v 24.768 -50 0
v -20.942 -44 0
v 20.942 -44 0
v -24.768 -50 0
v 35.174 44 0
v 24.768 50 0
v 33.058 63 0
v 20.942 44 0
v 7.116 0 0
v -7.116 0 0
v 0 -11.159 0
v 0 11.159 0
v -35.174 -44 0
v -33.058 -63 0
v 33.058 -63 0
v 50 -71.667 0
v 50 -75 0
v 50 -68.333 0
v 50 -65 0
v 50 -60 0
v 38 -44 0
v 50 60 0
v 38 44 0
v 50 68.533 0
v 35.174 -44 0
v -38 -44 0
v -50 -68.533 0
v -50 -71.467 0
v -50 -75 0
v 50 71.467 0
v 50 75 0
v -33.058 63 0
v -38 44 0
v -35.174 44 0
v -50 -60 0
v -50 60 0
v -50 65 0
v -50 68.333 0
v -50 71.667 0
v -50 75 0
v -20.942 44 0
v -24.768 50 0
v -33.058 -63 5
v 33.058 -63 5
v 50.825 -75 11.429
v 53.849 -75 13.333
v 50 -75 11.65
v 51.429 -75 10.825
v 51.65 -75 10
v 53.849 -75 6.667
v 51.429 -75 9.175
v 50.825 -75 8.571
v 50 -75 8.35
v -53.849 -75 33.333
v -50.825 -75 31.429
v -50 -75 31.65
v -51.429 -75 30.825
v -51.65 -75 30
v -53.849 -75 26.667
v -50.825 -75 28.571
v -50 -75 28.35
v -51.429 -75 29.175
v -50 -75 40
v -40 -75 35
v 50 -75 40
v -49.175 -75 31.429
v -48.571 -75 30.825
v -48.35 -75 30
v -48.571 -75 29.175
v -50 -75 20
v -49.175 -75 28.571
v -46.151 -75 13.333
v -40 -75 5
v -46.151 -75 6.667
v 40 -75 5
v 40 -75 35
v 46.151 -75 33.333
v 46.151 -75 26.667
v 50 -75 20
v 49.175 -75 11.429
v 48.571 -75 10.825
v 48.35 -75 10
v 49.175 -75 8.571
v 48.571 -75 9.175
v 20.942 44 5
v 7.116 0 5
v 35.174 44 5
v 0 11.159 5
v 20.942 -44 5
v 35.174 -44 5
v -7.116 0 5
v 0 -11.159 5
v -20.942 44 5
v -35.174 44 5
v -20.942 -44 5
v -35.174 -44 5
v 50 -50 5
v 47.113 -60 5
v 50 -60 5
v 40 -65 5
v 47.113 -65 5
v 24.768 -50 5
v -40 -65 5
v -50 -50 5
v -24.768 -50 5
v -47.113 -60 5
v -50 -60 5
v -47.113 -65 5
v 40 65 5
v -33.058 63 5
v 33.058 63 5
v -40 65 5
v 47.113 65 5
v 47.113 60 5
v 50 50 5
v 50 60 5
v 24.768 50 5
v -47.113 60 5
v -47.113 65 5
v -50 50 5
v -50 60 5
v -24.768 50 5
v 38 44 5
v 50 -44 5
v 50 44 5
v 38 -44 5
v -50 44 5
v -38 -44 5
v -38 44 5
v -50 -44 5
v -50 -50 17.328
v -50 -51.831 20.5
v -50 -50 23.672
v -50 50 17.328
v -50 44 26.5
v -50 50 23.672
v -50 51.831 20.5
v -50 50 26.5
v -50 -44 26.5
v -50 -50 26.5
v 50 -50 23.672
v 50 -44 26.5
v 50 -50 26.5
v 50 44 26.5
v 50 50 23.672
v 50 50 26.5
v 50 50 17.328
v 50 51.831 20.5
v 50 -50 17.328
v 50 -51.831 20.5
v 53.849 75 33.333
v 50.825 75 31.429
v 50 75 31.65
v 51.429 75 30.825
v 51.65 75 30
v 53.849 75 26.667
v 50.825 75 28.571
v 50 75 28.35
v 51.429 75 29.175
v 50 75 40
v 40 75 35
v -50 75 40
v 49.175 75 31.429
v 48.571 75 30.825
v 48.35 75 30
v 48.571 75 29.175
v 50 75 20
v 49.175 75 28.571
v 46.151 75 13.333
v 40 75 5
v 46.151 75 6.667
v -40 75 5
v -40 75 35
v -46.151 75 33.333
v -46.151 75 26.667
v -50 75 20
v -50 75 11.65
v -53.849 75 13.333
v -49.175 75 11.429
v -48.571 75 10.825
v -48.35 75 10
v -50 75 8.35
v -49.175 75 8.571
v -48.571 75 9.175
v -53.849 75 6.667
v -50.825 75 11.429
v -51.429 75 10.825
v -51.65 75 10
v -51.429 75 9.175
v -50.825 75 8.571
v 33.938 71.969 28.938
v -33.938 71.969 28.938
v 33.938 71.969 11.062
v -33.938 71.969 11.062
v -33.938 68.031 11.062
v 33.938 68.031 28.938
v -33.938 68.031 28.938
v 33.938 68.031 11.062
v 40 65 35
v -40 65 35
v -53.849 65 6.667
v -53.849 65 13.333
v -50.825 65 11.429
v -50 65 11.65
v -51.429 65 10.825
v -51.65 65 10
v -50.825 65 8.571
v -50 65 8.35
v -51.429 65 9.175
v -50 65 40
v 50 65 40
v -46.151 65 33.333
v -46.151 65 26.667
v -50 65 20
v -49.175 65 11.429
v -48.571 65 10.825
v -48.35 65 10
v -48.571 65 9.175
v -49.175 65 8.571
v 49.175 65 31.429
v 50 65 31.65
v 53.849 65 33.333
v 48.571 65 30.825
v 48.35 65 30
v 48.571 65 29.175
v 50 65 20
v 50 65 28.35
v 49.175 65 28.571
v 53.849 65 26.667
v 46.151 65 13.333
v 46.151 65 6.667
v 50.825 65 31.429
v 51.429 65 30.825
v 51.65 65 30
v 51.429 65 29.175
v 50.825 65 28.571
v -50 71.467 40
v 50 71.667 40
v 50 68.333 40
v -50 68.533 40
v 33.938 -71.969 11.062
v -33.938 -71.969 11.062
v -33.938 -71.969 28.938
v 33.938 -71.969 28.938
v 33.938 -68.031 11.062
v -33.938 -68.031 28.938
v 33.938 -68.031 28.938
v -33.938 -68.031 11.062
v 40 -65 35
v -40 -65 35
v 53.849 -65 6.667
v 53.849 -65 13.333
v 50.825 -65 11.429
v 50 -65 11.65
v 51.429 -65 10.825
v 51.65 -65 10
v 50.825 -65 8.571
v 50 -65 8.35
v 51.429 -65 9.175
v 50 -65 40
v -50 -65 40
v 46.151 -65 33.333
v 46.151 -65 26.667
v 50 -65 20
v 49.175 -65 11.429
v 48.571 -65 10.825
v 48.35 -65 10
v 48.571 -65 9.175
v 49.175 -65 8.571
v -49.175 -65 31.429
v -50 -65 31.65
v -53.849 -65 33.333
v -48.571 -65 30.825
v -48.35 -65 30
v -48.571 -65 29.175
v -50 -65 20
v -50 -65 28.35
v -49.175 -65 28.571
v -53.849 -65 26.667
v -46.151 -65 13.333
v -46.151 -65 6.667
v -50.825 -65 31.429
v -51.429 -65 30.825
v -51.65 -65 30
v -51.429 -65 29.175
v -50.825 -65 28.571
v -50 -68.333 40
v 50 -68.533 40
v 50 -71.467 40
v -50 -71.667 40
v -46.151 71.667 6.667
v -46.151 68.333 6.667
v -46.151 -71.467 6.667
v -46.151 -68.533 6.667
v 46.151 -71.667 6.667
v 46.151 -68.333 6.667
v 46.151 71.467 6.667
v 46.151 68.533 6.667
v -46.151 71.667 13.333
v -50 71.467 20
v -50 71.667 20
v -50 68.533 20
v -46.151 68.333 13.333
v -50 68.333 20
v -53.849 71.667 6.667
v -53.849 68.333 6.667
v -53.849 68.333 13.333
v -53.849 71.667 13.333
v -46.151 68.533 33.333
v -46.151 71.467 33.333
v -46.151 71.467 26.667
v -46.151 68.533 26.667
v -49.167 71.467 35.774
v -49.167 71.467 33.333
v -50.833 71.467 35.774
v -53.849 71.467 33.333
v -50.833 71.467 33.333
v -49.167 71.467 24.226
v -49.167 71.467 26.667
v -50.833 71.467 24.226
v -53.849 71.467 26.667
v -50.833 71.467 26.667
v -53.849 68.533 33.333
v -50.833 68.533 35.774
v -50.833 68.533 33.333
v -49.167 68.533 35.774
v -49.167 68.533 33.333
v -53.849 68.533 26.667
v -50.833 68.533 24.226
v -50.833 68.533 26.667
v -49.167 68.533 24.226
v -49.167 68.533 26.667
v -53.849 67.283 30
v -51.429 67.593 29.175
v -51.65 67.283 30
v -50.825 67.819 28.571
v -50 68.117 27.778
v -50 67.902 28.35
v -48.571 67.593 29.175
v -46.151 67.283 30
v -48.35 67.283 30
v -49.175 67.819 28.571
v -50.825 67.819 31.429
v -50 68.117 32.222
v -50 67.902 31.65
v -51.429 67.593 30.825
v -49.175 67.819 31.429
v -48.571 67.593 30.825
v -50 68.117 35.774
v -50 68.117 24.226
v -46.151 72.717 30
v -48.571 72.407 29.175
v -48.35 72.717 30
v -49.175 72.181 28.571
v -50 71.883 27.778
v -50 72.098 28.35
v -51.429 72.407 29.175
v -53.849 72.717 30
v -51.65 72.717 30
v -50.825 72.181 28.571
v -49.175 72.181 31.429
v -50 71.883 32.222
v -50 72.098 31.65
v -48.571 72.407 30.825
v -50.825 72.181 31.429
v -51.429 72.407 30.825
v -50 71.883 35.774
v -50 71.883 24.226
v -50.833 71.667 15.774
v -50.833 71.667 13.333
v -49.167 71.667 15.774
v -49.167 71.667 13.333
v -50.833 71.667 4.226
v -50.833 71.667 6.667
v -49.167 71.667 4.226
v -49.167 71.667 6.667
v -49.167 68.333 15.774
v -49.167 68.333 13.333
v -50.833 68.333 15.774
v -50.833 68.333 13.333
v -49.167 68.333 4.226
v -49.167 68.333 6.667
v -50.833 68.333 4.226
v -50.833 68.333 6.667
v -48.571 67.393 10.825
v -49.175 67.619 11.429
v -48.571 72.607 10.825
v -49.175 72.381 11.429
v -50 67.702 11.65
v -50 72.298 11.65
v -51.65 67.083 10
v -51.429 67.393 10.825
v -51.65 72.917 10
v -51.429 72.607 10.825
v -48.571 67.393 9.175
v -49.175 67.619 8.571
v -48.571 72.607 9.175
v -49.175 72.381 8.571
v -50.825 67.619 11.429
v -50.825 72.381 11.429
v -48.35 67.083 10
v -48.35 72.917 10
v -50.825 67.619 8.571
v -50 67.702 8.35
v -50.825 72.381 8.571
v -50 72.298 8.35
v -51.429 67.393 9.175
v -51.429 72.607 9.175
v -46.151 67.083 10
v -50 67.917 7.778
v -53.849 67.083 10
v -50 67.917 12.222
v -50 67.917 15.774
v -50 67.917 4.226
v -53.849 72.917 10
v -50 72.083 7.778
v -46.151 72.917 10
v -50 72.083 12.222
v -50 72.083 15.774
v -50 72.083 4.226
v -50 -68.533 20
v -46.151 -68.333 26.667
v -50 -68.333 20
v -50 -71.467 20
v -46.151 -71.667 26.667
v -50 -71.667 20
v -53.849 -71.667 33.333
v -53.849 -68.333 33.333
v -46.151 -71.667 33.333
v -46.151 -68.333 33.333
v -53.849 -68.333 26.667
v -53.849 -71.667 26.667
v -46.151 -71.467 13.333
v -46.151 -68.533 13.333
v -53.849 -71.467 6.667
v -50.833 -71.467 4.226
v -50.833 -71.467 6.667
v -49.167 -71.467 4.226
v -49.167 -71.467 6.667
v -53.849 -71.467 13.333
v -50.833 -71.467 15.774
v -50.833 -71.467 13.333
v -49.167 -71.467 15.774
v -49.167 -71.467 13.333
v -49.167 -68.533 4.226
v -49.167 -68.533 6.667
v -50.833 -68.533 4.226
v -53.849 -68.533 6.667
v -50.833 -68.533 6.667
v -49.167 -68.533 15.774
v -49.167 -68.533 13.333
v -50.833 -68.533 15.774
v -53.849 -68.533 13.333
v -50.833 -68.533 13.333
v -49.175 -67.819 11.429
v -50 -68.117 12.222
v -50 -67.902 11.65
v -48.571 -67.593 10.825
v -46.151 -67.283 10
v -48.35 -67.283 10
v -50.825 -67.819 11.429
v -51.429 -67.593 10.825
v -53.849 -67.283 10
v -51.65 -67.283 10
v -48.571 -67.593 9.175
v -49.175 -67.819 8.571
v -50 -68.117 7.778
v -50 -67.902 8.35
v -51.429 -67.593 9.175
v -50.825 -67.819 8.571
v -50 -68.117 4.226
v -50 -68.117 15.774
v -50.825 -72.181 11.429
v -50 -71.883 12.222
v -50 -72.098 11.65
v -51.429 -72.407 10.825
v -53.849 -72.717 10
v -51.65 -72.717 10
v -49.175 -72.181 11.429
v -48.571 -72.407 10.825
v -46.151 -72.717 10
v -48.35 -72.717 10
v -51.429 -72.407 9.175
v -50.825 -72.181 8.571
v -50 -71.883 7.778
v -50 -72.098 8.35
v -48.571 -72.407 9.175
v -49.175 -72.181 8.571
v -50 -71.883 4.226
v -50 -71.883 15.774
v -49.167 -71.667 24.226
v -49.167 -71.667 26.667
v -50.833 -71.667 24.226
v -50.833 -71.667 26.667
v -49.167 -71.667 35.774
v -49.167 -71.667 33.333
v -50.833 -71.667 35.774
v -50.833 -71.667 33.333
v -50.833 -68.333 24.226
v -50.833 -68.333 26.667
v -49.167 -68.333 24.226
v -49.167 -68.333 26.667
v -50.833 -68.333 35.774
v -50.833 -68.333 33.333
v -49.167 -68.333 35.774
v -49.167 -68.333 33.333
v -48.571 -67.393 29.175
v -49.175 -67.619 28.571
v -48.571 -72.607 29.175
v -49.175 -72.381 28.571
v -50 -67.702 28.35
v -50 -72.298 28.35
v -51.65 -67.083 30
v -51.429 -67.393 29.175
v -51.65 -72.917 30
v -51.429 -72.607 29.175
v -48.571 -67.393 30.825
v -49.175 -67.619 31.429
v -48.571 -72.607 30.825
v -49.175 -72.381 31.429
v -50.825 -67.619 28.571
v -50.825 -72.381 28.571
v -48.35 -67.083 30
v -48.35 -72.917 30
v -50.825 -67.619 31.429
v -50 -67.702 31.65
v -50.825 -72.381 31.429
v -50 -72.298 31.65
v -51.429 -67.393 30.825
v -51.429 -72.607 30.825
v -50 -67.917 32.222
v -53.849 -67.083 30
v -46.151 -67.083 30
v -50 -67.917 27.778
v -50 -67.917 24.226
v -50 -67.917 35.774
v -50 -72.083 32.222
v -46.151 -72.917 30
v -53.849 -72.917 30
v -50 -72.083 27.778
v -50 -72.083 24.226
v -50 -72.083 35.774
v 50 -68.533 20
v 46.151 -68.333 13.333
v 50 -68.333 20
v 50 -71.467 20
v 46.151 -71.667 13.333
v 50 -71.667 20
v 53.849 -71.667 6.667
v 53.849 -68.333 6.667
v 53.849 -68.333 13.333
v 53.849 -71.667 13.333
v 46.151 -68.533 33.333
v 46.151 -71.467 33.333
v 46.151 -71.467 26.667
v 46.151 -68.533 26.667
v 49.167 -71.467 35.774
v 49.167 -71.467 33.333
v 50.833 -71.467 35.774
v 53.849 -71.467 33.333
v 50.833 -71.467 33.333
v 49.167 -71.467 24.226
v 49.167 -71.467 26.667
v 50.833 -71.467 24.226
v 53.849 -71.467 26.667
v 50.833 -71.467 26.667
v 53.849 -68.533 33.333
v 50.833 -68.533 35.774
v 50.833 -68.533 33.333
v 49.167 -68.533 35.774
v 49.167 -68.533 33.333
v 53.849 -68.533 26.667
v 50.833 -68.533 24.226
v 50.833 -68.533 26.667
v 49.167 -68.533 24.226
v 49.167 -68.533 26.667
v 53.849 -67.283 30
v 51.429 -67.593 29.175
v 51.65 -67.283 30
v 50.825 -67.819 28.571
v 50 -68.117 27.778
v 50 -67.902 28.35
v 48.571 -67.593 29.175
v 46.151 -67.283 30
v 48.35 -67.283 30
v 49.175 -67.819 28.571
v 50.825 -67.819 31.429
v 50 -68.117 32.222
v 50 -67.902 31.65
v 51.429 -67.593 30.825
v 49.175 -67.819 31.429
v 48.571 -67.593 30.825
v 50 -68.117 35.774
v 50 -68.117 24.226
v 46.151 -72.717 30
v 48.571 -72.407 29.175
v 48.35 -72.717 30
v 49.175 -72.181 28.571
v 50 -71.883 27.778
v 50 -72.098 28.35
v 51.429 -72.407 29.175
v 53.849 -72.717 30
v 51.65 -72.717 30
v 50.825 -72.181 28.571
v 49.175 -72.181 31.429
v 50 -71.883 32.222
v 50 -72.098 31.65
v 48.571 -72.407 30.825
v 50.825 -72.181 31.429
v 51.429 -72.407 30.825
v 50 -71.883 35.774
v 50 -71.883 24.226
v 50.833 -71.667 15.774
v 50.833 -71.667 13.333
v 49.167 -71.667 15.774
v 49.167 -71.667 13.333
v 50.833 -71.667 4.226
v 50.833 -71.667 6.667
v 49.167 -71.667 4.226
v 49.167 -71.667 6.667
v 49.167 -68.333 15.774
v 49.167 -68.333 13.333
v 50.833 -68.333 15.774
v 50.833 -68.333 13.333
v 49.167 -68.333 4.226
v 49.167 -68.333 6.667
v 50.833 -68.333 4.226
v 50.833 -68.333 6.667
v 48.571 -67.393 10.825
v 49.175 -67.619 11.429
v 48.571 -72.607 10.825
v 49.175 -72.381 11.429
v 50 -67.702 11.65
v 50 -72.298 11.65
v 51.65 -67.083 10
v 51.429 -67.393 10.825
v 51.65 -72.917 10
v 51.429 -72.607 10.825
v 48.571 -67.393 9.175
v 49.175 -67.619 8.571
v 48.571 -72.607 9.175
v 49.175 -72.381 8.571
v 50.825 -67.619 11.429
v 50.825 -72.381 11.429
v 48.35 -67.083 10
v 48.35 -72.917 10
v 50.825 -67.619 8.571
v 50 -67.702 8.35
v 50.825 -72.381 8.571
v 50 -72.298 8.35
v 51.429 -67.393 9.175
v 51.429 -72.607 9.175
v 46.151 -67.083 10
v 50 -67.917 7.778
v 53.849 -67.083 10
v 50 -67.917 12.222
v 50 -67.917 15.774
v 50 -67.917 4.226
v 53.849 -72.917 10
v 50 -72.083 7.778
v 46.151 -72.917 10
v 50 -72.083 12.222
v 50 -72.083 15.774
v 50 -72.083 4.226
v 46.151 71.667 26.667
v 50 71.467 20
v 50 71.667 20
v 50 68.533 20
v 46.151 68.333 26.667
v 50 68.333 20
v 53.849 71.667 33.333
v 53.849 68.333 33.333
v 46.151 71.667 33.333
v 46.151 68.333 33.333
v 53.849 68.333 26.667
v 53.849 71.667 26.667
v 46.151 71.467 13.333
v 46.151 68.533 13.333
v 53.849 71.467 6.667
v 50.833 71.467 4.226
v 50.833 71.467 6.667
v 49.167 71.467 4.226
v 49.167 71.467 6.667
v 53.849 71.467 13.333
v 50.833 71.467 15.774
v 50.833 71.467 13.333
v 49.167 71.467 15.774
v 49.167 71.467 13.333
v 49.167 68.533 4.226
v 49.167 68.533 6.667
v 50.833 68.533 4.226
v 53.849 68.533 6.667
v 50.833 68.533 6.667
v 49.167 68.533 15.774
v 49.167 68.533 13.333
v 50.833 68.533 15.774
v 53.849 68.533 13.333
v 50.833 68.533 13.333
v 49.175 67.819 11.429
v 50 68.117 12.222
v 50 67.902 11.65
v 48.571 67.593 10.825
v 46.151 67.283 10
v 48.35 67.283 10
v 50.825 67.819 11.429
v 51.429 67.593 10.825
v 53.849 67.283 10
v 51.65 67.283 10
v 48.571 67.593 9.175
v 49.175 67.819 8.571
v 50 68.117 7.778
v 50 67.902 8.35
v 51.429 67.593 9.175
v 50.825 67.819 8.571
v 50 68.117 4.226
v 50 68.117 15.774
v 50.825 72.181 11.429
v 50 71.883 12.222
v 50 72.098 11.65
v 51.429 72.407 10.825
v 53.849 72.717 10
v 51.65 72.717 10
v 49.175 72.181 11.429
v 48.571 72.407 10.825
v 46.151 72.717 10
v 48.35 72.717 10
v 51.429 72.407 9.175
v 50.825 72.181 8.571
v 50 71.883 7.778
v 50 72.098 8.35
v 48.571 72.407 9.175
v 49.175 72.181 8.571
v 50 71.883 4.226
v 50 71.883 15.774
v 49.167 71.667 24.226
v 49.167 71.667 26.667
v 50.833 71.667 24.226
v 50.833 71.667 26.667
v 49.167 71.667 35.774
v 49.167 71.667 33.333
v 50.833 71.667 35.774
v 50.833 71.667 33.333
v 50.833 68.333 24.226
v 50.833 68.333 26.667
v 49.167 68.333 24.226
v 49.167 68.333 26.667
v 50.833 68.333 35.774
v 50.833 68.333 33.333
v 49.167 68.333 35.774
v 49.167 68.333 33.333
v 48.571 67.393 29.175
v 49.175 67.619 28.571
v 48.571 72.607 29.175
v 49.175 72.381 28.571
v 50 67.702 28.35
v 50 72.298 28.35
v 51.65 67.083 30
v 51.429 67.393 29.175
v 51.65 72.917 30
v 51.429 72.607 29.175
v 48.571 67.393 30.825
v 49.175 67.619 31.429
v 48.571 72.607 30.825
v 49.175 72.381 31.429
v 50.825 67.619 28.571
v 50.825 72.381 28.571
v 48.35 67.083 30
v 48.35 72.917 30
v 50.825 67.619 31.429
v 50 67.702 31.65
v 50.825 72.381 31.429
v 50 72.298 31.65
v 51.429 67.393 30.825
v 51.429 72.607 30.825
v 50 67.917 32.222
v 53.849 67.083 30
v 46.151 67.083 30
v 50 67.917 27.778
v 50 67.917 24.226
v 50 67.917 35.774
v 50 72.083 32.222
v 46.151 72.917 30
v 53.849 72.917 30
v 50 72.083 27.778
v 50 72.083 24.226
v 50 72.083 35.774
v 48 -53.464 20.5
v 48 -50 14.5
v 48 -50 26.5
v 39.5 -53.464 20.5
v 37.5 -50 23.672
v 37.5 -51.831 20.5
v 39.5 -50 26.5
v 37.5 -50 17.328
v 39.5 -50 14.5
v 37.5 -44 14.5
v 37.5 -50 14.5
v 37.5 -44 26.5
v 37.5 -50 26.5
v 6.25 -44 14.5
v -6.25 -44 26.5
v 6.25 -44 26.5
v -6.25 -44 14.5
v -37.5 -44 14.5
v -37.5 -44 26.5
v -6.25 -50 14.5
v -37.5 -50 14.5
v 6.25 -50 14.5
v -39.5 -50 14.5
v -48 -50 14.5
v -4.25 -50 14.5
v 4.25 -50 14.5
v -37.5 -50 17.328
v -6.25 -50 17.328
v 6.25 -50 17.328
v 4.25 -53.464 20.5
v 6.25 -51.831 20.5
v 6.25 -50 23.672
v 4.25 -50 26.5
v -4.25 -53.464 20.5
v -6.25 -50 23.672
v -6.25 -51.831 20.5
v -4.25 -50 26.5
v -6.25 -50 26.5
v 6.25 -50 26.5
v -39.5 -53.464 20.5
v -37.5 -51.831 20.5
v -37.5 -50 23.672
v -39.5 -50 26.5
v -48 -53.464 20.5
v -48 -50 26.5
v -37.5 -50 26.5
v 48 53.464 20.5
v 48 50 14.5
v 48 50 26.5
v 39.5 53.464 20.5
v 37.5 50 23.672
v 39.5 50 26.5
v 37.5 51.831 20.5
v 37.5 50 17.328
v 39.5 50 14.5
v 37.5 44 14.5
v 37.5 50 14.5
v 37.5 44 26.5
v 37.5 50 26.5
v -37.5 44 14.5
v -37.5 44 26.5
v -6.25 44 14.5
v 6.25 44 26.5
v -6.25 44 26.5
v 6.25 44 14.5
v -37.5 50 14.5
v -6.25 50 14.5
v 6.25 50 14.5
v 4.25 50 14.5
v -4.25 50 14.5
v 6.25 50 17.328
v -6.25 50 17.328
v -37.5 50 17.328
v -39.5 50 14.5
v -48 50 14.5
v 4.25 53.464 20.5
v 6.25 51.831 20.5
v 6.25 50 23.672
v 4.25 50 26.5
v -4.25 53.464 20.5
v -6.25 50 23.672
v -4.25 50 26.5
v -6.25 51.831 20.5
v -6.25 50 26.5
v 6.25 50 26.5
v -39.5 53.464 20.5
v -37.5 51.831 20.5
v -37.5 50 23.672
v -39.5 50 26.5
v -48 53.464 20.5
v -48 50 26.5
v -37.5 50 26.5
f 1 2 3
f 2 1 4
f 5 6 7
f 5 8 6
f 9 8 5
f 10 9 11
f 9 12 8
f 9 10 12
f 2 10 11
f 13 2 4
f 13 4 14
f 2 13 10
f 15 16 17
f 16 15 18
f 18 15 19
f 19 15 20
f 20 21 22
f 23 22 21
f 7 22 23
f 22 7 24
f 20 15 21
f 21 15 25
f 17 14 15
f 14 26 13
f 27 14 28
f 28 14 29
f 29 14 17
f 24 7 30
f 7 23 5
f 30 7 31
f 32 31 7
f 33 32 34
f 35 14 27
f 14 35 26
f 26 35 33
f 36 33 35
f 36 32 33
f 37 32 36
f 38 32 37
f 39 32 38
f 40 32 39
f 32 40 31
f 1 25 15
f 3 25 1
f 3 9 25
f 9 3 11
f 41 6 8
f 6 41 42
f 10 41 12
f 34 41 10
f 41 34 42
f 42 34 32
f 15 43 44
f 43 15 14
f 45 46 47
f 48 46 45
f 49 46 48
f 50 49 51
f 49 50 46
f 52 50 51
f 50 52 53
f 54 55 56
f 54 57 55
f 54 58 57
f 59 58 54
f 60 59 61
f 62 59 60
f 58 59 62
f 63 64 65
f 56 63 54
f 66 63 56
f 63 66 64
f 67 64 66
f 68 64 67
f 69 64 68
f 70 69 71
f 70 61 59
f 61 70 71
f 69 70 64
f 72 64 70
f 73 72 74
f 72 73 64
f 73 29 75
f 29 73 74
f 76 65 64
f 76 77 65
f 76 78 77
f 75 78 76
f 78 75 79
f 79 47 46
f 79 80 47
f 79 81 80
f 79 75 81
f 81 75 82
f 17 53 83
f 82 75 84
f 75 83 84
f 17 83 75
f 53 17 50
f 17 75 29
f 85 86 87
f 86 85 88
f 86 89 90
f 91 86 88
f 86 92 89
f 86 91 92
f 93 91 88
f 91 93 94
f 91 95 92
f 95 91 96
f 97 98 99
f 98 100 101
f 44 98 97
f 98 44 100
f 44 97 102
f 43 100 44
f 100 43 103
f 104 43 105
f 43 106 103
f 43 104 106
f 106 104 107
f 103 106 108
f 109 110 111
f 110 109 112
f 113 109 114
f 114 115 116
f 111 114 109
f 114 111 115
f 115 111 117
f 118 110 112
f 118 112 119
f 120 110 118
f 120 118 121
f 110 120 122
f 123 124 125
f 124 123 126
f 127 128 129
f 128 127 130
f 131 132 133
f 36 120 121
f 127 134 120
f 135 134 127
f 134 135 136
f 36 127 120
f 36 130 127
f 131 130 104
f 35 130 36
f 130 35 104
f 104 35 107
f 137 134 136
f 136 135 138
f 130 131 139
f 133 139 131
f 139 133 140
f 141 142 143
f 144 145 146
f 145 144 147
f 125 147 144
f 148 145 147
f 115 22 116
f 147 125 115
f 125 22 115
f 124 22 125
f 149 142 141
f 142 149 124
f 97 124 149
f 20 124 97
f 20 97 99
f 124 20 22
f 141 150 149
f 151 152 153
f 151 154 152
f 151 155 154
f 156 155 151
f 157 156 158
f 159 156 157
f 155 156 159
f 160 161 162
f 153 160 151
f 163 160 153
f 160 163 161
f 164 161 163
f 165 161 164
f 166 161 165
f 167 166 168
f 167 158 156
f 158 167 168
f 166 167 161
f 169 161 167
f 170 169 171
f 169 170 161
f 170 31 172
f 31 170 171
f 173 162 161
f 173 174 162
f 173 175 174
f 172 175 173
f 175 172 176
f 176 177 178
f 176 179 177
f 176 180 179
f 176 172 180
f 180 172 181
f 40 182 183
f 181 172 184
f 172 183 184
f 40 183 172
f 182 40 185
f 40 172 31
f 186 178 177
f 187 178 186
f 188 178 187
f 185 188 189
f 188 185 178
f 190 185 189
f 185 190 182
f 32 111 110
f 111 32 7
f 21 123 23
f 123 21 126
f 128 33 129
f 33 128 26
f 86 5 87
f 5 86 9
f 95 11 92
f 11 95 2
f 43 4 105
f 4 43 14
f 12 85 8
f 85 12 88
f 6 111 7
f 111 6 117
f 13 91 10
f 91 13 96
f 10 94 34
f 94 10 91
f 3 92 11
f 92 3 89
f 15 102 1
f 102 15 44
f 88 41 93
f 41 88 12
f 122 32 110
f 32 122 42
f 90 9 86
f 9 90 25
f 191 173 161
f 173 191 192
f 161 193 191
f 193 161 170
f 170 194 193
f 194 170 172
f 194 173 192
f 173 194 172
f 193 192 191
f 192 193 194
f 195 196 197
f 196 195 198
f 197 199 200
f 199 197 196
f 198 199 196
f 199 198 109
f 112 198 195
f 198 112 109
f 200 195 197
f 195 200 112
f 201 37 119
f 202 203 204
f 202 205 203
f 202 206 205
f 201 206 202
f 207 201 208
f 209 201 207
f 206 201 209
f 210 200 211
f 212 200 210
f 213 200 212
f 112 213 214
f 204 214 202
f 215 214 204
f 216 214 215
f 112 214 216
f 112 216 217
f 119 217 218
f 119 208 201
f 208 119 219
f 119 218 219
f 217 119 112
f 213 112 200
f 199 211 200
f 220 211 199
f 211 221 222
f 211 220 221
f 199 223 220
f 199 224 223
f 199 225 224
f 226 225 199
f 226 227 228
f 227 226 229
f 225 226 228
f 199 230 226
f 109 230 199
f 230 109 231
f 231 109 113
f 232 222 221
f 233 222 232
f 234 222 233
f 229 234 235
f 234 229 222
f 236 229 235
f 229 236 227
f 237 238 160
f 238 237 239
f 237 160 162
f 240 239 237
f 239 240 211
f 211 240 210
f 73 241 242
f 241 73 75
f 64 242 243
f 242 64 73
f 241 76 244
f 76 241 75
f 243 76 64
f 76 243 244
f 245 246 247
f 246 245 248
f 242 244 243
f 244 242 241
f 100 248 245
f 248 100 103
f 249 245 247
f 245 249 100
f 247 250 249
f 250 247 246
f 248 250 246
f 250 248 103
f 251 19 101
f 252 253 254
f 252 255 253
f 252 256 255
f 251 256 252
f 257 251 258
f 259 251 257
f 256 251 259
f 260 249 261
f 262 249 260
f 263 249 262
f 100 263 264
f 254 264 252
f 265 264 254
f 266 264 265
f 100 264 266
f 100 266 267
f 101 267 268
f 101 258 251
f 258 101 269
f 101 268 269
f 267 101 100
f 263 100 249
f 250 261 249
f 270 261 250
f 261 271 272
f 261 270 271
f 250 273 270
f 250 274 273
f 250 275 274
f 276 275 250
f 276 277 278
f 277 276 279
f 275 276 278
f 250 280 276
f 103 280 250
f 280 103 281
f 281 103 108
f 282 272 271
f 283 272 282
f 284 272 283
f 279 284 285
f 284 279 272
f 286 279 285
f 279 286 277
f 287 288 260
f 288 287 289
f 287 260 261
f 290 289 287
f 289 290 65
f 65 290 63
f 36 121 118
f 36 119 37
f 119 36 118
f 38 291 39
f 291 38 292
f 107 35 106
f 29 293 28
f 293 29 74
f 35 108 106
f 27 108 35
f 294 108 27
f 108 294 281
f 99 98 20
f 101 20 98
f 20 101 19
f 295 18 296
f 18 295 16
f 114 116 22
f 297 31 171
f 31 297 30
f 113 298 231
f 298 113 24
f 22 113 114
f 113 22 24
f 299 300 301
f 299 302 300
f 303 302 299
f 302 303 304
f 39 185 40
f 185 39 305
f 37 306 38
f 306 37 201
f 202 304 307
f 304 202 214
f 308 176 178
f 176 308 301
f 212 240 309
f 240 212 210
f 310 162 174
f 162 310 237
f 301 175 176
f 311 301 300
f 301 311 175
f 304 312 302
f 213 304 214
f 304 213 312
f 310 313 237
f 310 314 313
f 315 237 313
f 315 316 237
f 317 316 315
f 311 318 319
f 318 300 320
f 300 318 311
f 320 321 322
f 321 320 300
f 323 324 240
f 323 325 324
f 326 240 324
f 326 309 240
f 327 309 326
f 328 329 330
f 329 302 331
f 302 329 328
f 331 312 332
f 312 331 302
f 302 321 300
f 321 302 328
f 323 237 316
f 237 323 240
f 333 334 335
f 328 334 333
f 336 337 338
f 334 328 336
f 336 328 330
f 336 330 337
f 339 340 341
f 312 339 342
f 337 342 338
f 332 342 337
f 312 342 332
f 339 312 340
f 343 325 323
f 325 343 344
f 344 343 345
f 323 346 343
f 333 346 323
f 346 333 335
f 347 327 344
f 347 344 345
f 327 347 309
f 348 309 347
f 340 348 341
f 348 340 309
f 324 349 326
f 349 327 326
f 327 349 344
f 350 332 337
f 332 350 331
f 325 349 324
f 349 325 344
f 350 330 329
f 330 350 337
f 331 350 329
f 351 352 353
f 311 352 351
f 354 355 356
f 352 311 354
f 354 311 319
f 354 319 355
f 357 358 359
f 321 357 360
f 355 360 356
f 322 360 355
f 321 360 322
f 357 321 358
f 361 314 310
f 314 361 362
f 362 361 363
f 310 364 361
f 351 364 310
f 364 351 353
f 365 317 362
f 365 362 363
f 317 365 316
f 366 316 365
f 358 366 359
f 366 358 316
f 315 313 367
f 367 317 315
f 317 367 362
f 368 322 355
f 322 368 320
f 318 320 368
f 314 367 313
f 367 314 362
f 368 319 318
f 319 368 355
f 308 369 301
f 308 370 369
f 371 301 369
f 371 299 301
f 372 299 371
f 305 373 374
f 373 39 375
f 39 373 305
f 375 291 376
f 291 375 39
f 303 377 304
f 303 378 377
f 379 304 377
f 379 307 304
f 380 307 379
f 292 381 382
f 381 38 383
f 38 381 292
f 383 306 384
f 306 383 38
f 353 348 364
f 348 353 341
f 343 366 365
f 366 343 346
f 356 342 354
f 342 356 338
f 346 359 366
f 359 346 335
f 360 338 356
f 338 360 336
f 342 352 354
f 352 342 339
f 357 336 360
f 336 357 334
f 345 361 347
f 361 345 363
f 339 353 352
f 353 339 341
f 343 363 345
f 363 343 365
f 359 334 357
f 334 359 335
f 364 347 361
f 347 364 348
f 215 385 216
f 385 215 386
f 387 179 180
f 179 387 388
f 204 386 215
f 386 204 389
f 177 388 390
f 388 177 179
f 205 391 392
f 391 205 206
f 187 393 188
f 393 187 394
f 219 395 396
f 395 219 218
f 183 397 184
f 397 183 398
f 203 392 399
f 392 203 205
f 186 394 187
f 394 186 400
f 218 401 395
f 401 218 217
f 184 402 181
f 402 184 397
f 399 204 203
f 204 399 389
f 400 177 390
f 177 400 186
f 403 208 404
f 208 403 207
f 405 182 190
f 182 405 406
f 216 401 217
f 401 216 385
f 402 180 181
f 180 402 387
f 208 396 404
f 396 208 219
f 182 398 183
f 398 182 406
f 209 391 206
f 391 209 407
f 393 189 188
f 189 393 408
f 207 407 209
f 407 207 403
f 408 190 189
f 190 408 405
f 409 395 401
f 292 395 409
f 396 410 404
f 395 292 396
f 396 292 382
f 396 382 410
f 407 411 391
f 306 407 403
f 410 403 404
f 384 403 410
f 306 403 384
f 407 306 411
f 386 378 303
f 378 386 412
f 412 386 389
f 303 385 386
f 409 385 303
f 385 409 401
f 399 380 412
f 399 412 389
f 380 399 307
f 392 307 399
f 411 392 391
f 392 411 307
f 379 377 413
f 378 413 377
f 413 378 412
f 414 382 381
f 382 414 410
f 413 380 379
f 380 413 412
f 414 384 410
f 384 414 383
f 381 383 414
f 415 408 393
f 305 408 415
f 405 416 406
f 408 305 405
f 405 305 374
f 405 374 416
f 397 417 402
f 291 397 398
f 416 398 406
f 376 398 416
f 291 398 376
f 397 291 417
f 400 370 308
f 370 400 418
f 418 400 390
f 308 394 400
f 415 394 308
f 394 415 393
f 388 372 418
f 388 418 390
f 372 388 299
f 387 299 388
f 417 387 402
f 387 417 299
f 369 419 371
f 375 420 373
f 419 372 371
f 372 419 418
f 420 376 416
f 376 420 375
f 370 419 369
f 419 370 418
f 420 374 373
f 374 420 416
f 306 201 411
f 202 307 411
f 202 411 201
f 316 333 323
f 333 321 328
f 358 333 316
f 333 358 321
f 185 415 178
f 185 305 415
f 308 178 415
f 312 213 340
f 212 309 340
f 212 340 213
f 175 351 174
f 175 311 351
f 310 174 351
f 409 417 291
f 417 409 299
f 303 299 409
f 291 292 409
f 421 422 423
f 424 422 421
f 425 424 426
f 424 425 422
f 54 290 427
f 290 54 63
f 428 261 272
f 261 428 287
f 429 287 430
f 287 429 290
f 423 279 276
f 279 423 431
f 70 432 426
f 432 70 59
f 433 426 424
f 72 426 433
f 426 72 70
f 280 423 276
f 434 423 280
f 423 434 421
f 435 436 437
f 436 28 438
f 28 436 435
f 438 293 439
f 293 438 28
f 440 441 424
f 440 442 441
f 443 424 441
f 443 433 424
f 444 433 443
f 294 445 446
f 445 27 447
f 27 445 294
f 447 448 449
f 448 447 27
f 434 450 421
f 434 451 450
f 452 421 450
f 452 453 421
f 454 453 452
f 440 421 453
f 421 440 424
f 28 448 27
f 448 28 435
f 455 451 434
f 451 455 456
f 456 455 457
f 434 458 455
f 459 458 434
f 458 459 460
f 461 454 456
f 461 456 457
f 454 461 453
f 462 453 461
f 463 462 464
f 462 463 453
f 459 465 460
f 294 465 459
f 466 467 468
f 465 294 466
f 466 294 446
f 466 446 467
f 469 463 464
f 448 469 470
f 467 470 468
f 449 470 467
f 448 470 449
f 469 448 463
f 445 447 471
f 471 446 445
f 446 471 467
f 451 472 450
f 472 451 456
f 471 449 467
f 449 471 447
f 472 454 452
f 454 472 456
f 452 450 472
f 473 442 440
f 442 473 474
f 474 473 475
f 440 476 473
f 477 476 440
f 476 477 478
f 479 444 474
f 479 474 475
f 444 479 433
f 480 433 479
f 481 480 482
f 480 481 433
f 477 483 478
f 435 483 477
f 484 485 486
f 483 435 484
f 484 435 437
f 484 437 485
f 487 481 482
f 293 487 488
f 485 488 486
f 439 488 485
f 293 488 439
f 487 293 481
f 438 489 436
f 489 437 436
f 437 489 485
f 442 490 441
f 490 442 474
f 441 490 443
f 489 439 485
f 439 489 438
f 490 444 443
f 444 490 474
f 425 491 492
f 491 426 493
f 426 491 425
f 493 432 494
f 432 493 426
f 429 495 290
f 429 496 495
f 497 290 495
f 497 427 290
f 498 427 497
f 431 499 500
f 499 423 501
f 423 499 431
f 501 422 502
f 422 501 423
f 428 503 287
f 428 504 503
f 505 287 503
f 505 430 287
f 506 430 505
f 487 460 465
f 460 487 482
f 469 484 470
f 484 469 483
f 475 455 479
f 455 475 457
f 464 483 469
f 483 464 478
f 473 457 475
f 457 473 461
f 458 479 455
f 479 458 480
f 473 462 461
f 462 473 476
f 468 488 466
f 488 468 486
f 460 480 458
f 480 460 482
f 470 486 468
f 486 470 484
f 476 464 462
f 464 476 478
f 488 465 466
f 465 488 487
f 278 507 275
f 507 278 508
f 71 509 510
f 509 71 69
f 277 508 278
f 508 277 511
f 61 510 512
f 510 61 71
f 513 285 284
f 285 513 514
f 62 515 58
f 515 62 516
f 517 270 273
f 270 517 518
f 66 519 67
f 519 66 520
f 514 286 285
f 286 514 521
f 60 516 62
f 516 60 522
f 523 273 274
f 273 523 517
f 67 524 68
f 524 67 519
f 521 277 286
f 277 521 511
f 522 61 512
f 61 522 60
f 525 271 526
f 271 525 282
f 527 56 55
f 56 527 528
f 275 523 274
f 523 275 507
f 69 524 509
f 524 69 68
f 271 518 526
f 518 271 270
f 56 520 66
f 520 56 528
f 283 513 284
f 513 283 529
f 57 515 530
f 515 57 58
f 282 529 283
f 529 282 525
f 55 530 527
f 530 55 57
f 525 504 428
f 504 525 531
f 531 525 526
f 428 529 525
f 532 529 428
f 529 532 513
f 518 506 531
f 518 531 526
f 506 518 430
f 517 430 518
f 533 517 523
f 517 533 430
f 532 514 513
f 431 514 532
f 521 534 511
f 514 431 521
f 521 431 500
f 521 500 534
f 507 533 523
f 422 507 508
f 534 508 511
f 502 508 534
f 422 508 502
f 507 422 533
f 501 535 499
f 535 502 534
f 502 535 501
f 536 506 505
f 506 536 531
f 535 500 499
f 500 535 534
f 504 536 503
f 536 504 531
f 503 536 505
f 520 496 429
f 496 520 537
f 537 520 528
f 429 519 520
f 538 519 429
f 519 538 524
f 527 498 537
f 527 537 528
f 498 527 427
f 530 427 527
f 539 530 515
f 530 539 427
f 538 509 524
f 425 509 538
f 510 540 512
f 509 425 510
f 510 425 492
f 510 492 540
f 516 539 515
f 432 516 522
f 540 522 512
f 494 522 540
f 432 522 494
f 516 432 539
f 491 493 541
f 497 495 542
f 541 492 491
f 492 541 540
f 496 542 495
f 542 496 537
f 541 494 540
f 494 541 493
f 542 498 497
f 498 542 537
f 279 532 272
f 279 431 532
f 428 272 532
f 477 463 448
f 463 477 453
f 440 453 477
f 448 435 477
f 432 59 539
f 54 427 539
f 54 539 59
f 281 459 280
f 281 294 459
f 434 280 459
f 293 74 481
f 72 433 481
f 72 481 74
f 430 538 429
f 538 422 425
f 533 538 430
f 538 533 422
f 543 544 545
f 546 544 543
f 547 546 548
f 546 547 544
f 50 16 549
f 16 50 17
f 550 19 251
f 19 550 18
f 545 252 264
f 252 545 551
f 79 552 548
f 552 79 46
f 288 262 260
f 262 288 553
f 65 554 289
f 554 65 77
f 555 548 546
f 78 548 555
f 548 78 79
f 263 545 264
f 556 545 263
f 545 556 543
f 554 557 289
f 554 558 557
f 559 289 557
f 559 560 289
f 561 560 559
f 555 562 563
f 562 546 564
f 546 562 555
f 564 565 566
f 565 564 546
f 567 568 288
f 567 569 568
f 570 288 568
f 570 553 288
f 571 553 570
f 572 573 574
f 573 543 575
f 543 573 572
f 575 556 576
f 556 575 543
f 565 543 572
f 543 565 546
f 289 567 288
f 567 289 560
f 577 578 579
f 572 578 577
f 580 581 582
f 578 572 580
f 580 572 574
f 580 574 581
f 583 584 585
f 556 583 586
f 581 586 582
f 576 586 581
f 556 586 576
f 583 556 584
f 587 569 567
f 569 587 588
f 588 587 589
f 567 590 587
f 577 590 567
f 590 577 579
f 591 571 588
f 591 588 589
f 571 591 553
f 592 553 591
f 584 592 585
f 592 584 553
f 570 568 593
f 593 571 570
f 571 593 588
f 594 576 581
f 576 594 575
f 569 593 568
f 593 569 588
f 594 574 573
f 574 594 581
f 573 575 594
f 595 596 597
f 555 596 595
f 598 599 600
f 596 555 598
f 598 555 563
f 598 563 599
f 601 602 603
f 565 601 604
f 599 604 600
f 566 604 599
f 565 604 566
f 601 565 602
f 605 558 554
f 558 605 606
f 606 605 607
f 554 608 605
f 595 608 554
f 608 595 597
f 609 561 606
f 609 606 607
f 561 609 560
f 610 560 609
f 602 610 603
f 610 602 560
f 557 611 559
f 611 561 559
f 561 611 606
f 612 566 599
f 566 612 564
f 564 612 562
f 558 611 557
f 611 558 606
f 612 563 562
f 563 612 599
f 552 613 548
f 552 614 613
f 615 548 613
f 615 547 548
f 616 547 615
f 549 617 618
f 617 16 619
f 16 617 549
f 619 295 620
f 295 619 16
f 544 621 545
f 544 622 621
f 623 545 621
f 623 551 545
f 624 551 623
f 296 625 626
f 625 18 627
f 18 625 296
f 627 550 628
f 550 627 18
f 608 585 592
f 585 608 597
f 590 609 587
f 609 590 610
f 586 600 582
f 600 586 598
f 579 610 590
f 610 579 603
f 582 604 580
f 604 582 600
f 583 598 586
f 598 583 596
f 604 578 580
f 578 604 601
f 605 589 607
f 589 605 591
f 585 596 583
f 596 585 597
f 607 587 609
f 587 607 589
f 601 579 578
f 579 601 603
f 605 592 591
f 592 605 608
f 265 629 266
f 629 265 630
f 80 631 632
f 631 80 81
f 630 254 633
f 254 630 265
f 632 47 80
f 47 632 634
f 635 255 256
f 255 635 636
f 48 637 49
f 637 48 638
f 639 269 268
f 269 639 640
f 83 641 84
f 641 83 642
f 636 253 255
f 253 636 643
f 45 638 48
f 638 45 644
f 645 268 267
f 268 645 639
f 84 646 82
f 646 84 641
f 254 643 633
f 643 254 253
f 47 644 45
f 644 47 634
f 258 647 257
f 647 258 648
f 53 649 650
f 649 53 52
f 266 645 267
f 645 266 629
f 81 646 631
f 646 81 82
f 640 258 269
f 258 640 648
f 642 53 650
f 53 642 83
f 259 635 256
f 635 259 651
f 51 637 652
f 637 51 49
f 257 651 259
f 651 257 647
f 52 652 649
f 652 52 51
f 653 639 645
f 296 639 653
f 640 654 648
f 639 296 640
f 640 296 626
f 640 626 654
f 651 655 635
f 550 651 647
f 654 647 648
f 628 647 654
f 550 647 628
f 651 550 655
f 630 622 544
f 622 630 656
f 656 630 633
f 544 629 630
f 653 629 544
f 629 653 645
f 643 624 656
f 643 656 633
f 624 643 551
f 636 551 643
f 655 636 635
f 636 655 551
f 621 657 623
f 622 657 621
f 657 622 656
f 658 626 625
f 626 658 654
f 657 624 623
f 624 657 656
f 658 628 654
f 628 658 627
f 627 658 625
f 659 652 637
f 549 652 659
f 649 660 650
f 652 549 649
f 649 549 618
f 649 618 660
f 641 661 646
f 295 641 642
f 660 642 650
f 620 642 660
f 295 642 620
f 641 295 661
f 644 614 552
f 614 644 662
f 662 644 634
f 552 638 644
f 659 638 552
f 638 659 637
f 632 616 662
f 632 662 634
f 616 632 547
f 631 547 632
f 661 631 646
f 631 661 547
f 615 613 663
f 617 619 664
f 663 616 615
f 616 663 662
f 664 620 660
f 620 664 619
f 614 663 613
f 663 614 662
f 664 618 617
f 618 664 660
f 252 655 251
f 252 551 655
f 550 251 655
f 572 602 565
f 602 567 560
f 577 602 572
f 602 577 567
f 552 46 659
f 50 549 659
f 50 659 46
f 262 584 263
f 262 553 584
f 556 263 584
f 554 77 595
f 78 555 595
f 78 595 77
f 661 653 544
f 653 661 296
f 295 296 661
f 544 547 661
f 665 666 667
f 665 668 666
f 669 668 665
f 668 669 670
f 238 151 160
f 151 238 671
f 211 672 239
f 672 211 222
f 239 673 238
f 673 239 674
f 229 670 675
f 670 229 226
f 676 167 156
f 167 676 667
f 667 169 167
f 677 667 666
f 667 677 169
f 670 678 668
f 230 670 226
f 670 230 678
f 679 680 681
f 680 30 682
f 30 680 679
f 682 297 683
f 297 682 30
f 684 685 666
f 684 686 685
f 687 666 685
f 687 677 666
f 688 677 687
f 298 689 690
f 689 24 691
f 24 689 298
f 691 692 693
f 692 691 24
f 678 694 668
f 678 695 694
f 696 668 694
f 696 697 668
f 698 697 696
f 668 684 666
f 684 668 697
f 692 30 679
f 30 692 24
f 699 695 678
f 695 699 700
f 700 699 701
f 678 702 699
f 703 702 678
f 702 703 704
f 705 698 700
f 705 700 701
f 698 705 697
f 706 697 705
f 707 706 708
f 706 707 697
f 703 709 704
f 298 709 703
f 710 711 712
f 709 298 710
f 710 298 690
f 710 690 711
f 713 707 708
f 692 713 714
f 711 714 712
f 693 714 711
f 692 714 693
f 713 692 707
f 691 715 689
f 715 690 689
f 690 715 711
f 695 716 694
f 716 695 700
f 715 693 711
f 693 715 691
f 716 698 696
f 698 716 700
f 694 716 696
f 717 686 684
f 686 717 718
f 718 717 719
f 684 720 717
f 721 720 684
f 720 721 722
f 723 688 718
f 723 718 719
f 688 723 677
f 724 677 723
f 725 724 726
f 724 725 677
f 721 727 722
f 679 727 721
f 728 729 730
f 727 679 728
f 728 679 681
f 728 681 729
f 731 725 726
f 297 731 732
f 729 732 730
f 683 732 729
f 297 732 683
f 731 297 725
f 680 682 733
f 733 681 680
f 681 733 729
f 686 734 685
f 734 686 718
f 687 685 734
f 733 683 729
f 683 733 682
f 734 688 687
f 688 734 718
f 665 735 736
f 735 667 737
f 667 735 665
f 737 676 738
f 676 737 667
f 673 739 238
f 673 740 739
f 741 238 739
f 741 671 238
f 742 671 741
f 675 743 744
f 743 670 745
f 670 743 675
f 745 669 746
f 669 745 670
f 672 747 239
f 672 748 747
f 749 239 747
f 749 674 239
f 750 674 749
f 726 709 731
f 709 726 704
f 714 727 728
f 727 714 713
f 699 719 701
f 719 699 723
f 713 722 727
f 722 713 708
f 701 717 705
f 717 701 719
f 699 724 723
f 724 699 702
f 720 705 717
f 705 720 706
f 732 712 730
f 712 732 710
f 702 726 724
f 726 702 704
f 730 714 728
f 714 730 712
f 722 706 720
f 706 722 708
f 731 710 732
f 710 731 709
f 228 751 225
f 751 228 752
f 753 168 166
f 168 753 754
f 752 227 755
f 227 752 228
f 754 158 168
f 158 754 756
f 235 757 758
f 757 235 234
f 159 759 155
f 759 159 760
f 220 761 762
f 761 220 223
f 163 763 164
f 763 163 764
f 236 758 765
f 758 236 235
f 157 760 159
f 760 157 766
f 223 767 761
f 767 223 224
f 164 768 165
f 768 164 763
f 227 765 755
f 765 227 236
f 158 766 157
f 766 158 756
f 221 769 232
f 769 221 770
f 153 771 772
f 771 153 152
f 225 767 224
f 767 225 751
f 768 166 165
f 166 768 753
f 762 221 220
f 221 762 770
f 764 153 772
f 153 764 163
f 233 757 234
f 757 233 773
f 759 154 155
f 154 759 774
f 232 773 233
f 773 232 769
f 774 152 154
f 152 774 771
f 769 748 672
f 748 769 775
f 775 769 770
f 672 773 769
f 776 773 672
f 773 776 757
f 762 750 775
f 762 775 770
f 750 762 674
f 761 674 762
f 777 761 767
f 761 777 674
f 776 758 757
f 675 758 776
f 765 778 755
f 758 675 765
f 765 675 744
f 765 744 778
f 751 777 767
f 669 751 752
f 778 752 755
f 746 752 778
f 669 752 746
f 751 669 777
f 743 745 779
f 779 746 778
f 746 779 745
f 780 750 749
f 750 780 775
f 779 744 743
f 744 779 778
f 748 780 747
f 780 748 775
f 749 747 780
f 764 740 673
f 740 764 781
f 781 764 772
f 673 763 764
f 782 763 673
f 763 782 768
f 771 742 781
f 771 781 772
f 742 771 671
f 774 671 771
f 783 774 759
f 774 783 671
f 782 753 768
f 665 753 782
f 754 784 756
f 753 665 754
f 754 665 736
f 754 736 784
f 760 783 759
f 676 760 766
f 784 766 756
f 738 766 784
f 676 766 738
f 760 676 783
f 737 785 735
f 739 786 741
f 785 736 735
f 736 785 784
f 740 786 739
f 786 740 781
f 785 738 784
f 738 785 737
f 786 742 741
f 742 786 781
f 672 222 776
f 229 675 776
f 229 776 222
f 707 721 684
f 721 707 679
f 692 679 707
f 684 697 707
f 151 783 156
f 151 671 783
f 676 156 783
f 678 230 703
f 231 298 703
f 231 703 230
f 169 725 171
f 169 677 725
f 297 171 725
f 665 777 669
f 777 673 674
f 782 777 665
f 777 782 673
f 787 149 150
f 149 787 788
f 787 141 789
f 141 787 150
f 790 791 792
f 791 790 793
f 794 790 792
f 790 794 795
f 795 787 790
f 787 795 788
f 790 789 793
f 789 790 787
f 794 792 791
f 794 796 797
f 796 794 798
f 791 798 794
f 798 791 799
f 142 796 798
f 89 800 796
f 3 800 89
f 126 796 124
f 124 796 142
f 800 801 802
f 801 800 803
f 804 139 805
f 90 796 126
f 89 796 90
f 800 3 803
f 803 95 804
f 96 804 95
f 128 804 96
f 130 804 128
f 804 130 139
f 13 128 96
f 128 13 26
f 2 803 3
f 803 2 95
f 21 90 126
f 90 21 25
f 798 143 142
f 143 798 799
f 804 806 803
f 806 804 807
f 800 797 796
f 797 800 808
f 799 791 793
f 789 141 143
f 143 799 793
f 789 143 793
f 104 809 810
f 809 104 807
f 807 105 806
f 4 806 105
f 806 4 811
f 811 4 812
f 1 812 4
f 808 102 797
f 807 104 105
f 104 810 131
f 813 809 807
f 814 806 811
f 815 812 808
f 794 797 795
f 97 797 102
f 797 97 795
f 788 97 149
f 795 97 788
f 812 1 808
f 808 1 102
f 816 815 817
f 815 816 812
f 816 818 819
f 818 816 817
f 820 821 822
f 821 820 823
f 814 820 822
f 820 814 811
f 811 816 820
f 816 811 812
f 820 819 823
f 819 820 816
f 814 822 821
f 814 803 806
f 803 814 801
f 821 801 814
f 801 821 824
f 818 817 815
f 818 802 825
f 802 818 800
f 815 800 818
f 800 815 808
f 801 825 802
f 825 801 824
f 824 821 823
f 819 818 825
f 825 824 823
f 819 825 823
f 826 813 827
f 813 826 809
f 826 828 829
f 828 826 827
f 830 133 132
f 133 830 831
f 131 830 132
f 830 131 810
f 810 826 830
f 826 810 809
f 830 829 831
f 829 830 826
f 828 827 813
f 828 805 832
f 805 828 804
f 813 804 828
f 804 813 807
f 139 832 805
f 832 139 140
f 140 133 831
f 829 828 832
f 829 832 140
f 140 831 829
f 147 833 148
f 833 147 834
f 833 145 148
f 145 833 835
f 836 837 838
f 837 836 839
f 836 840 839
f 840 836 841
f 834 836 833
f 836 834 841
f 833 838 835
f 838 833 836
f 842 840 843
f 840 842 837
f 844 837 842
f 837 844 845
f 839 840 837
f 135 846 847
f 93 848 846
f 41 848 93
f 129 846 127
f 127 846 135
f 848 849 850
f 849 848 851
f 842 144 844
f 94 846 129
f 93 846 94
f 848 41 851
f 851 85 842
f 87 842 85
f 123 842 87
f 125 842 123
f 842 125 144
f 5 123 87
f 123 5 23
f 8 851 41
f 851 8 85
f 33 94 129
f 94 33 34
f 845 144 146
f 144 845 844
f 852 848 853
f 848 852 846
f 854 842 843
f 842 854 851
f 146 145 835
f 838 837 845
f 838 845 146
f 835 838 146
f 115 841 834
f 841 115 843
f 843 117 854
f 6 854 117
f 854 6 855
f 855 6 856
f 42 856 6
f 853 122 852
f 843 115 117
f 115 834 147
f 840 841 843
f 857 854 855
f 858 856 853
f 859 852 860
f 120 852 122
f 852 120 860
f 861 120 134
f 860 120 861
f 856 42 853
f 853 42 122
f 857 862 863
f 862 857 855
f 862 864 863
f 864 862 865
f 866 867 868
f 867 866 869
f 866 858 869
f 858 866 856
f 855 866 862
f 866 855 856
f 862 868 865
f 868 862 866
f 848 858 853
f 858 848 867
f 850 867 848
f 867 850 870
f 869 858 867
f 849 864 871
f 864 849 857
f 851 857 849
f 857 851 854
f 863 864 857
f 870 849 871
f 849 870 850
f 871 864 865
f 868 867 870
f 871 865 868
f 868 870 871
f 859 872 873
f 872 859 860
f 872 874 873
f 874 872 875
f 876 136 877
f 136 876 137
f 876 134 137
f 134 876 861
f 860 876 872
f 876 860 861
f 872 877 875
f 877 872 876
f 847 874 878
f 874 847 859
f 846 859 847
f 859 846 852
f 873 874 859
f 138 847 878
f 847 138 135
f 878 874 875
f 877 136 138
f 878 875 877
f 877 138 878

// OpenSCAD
include <config.scad>
use <GDMUtils.scad>
use <slider_sled.scad>


module xy_sled(show_rollers=false)
{
	slider_sled(show_rollers=show_rollers, with_rack=true);
}



module xy_sled_part() { // make me
	zrot(90) xy_sled();
}


xy_sled_part();


// vim: noexpandtab tabstop=4 shiftwidth=4 softtabstop=4 nowrap
